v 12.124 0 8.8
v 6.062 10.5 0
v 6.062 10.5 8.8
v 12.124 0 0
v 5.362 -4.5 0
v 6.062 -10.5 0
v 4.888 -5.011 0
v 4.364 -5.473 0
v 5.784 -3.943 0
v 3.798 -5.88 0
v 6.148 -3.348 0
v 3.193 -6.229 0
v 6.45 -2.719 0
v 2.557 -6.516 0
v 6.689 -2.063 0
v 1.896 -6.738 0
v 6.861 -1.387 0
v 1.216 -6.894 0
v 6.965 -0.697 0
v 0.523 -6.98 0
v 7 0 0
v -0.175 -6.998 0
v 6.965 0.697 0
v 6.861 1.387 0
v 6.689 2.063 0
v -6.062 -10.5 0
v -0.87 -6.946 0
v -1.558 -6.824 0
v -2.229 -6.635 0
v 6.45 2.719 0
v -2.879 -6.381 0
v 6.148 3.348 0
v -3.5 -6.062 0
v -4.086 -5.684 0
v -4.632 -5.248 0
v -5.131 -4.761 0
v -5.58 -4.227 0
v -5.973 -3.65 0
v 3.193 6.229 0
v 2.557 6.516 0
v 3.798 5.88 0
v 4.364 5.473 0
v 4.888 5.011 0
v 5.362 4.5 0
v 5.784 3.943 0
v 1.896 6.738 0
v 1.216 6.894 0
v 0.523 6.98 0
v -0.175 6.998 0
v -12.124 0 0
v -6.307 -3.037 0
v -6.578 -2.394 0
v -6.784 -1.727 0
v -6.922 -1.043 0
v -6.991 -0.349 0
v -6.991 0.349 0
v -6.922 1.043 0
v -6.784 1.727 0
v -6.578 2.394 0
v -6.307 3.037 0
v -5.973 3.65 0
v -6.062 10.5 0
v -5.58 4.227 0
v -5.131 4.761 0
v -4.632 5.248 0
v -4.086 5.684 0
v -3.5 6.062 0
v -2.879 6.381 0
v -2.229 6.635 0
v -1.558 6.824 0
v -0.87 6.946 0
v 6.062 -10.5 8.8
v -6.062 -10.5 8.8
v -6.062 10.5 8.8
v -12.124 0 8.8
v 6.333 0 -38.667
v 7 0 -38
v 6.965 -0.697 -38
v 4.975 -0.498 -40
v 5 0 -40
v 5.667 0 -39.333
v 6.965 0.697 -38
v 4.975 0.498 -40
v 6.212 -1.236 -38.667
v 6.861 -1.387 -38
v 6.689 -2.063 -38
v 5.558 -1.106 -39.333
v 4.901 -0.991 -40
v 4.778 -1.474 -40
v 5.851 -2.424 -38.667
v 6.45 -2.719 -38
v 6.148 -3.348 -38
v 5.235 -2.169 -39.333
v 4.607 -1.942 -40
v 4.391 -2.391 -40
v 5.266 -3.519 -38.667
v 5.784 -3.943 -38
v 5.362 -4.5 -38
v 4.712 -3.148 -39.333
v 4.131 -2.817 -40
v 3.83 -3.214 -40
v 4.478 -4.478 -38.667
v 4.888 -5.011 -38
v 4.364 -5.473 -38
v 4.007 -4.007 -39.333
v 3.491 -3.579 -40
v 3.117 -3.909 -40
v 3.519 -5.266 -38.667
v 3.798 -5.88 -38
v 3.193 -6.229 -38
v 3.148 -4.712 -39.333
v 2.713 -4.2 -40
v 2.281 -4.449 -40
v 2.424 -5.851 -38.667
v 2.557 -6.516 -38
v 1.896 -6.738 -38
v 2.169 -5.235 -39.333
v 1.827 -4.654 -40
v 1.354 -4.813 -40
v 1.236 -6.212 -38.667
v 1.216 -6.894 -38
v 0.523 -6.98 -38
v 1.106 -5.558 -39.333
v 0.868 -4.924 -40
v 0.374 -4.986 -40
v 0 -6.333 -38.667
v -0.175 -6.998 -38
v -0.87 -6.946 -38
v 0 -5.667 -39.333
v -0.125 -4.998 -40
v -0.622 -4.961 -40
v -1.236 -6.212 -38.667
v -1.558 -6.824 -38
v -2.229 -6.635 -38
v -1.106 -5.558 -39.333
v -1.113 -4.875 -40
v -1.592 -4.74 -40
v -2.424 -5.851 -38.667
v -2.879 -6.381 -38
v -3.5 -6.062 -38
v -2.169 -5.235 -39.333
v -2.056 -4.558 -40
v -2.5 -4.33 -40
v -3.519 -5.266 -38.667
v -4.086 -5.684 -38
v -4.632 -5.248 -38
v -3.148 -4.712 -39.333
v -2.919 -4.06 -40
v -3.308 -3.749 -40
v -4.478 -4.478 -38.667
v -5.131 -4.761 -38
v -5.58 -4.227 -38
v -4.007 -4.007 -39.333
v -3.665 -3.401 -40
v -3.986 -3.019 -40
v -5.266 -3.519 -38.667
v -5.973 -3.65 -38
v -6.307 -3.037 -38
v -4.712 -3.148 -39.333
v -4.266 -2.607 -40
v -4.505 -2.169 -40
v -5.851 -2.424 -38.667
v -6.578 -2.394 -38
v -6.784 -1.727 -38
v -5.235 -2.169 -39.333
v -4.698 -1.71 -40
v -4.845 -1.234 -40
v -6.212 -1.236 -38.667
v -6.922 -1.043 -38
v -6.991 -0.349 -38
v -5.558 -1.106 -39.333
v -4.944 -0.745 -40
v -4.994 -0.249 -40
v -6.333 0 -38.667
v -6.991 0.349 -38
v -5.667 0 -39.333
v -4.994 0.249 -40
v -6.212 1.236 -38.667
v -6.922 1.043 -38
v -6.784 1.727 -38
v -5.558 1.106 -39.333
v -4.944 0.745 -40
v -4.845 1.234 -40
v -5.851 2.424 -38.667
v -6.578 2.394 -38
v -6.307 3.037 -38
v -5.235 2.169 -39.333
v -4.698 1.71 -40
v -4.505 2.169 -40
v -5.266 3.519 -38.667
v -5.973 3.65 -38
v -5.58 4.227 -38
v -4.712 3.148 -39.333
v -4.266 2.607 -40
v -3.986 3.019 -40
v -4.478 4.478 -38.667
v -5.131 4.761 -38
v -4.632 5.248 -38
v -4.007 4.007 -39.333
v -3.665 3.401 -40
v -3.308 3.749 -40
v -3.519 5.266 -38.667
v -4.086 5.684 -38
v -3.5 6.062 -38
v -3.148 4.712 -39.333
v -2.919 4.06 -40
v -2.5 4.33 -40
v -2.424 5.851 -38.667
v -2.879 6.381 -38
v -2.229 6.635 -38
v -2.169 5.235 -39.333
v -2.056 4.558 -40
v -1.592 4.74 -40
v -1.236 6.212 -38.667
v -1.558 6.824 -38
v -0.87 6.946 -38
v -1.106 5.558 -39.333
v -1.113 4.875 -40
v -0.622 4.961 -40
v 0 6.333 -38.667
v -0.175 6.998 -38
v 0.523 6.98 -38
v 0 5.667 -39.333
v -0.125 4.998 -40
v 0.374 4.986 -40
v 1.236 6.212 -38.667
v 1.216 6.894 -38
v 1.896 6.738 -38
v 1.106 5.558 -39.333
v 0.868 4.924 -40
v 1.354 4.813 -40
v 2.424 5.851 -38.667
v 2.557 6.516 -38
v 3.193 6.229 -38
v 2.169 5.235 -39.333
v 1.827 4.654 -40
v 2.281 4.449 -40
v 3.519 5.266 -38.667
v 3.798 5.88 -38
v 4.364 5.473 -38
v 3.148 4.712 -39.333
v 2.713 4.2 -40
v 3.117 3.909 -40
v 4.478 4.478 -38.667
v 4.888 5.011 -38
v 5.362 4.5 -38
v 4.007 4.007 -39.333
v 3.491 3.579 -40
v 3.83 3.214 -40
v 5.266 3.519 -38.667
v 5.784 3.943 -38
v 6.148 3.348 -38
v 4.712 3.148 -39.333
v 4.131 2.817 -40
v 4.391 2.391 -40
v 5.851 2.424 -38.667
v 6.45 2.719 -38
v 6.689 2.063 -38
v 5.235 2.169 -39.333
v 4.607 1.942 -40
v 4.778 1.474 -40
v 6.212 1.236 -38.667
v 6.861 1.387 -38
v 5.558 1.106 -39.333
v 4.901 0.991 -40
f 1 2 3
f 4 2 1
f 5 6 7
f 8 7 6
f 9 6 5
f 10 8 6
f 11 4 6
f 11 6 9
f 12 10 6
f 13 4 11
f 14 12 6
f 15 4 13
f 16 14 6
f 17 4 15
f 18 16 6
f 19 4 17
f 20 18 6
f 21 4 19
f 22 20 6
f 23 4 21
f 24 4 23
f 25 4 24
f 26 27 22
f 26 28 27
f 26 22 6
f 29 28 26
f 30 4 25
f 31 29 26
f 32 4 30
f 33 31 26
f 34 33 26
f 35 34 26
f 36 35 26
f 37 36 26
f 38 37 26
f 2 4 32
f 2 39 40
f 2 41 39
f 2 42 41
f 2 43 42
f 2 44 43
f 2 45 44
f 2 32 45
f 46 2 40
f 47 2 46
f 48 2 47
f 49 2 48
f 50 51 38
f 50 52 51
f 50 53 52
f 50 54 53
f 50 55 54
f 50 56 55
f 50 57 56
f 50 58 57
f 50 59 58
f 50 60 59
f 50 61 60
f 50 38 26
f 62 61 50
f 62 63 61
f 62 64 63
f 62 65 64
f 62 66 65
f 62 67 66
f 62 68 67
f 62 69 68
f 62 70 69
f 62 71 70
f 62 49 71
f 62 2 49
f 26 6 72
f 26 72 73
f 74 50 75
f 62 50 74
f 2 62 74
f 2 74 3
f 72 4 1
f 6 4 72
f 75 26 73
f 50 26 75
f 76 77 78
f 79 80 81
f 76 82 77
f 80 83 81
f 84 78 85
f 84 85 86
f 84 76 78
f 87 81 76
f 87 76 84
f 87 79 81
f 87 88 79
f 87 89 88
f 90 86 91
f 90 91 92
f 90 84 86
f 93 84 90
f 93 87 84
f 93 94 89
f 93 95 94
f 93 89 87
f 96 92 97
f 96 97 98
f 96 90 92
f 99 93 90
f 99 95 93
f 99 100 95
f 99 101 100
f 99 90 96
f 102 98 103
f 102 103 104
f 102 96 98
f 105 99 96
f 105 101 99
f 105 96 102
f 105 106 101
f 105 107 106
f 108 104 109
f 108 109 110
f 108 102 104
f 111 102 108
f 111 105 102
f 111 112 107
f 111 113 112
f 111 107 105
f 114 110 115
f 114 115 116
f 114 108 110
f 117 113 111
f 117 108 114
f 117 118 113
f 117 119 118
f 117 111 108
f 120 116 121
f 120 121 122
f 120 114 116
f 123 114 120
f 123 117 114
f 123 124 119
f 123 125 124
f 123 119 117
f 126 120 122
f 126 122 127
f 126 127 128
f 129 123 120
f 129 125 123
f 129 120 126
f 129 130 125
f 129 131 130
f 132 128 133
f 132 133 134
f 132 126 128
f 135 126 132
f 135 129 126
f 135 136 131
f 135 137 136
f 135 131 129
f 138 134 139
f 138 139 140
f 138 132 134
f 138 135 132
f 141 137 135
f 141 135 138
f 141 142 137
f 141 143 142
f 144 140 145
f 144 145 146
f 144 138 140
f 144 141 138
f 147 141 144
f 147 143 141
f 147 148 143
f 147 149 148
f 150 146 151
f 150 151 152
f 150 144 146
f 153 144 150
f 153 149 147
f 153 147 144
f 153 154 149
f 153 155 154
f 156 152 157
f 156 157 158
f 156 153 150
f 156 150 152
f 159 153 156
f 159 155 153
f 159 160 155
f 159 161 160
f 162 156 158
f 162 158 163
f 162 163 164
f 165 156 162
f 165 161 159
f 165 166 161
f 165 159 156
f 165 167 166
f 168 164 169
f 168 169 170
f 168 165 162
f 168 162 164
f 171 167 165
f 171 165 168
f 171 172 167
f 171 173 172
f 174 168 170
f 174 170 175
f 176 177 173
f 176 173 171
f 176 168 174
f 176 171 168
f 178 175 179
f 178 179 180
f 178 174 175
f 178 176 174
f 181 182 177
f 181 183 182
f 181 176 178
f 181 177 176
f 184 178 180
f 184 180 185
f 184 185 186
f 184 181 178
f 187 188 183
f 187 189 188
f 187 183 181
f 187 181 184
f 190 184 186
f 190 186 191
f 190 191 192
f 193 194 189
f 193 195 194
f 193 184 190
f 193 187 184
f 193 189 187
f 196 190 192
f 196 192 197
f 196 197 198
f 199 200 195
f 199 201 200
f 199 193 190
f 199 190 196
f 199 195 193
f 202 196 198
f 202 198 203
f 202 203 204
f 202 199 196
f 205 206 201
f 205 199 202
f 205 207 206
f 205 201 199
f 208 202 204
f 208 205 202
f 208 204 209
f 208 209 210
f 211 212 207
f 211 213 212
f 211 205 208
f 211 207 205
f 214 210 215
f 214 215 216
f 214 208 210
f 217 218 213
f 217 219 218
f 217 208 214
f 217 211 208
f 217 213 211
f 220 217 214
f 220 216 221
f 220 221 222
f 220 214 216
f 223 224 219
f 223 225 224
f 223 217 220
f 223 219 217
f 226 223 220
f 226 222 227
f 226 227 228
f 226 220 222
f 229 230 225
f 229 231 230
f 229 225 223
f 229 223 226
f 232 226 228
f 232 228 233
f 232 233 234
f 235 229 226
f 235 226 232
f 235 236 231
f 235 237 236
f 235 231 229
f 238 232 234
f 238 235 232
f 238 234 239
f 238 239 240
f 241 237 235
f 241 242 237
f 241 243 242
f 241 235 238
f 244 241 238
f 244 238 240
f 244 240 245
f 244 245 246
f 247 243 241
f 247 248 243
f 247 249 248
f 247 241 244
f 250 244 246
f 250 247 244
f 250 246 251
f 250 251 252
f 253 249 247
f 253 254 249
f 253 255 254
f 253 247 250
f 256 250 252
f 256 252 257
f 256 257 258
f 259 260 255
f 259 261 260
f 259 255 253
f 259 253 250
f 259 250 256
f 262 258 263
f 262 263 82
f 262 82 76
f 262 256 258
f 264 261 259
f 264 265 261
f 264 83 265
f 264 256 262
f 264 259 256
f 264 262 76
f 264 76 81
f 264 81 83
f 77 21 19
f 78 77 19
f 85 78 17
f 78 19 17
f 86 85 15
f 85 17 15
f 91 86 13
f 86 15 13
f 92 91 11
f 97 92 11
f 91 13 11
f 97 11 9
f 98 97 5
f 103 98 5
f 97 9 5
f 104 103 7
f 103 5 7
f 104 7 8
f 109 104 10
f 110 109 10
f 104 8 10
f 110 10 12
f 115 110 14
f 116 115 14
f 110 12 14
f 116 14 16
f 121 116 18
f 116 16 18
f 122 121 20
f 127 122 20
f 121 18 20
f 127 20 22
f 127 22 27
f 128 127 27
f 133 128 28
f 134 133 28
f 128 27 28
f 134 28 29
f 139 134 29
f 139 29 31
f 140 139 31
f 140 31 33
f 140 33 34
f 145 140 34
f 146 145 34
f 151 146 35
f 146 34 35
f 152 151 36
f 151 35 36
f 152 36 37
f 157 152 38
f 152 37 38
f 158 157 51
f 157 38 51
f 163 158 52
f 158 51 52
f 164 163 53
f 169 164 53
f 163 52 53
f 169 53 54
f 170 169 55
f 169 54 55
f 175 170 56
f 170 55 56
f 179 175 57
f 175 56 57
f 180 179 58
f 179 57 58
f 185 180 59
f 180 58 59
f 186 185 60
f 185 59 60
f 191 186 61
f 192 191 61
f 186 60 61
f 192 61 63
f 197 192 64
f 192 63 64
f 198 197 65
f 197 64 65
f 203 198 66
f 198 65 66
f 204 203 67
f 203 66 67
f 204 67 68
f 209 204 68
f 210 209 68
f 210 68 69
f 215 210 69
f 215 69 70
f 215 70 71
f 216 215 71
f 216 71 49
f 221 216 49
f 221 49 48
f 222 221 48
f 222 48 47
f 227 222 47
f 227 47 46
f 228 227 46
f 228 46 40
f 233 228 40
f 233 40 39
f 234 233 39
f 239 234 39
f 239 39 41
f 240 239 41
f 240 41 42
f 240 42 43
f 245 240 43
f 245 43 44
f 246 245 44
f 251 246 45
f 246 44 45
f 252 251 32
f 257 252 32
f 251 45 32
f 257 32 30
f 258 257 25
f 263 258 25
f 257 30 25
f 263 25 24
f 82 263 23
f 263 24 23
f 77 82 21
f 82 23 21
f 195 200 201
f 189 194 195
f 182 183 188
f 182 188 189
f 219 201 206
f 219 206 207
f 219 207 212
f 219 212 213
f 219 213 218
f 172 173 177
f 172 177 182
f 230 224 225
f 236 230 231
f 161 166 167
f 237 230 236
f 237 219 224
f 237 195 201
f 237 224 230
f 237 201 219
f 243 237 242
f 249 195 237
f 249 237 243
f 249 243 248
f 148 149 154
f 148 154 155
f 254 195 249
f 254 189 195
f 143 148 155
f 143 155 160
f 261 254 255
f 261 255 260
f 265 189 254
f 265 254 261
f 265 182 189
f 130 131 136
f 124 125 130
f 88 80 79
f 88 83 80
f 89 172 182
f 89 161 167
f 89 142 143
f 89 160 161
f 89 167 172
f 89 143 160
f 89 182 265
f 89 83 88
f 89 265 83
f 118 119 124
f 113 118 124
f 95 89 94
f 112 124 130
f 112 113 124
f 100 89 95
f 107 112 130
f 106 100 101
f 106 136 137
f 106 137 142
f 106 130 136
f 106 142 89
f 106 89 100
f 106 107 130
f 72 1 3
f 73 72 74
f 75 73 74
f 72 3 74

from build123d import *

# Parameters (mm, degrees)
BASE_EXTRUDE_DEPTH  = 8.8
SKETCH3_R           = 7
BOSS_EXTRUDE1_DEPTH = 40
CHAMFER1_SIZE       = 2


with BuildPart() as part:
    # Sketch1 → Base-Extrude (new body)
    with BuildSketch(Plane.XY):
        Polygon((-6.062177826, 10.5), (6.062177826, 10.5), (12.124355653, 0), (6.062177826, -10.5), (-6.062177826, -10.5), (-12.124355653, 0), align=None)
    extrude(amount=BASE_EXTRUDE_DEPTH)

    # Sketch3 → Boss-Extrude1 (add)
    with BuildSketch(Plane(origin=(0, 0, 0), x_dir=(-1, 0, 0), z_dir=(0, 0, -1))):
        with Locations(Location((0, 0, 0), (0, 0, 180))):
            Circle(SKETCH3_R)
    extrude(amount=BOSS_EXTRUDE1_DEPTH)

    # Chamfer1
    chamfer1_edges = [part.edges().sort_by_distance(p)[0] for p in [
        (-7, 0, -40),
    ]]
    chamfer(chamfer1_edges, length=CHAMFER1_SIZE)


solid = part.part
